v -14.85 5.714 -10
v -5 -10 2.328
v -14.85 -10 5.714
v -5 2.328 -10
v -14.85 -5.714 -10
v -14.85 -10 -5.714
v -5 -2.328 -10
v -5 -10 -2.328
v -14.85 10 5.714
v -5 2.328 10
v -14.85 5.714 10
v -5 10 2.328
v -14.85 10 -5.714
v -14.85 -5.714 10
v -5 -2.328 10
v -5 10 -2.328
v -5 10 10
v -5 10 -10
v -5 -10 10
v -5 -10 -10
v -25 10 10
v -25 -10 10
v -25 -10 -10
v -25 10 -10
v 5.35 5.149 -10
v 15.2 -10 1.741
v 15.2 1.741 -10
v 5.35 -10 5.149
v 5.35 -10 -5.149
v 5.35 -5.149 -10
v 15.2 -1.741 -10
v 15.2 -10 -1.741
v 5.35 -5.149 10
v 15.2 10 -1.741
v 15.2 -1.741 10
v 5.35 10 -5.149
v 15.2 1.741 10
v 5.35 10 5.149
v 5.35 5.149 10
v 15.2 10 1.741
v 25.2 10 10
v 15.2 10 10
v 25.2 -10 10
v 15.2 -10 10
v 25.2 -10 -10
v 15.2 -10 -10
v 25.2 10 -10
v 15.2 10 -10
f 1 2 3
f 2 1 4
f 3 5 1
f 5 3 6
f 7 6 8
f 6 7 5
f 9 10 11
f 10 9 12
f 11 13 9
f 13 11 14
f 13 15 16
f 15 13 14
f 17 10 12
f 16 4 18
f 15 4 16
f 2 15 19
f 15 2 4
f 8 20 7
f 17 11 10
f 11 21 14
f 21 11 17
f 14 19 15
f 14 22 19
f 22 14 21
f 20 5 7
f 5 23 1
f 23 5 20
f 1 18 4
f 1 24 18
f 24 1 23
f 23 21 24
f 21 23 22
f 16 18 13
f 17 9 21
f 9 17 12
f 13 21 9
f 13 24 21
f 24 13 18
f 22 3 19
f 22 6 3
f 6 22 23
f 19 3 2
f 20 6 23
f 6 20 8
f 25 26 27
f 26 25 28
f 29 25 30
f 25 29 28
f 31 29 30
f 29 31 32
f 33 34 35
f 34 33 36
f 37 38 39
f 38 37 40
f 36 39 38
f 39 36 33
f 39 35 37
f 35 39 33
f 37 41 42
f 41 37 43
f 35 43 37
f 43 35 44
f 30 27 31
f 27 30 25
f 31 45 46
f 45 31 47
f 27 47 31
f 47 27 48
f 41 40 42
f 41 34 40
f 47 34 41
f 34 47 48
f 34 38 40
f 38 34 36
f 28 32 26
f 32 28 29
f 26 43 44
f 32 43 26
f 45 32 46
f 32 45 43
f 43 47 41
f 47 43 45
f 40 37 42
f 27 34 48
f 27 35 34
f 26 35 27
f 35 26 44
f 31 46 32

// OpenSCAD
/**
  "Impossible" dovetail joint.
  Inspired by http://www.thingiverse.com/thing:172827.
 */

/* [Dimensions] */

// Each piece will be a cube with this dimension
SIZE = 20;

// Increase for a looser fit
SLACK = 0.4;

// Set this to ASSEMBLED, SEPARATE, PRINT1, or PRINT2.
STYLE = "SEPARATE";  // ["ASSEMBLED":Assembled, "SEPARATE":Separate, "PRINT1":First piece for printing, "PRINT2":Second piece for printing]
 
/* [Hidden] */

EPSILON = 0.1;

/* This function from:
 *  Dovetail parametric generator for OpenScad
 *  Générateur de queue d'aronde pour OpenScad
 *
 *  Copyright (c) 2012 Charles Rincheval.  All rights reserved.
 *  https://github.com/hugokernel/OpenSCAD_Dovetail
 *  http://www.digitalspirit.org/
 * 
 *  Create one tooth
 *  @param int width        Tooth width
 *  @param int height       Tooth height
 *  @param int thickness    Tooth thickness
 */
module dovetail_tooth(width, height, thickness, slack) {
    offset = width / 3 + slack / 2;
    translate([- width / 2, - height / 2, 0]) {
        linear_extrude(height = thickness) {
            polygon([[0, 0], [width, 0], [width - offset, height], [offset, height]]);
        }
    }
}

/* Makes two halves of a prism assembled by an "impossible" dovetail joint.
  Each piece will be a cube with dimension d; assembled they are 3/2 * d long.
  (That is, they overlap by 50% of their length.)
  'slack' is the sliding tolerance in mm.
  'part' is 1 for the first part, 2 for the second.
*/
module impossible(d, slack, part) {
  h = d * sqrt(2);
  big = 10;
  
  if (part == 1)
    translate([-d/4,0,0])
      color("GREEN") 
        difference() {
          cube(size = d, center = true);
          for (i=[-1, 1])
            translate([d/4 + slack, i * d/2, 0])  // orient on the edge and centered on the face
              rotate([-45,0,0])  // the trick: 45-degree rotation
                rotate([180,90,90])  // cutting orientation
                  translate([0, 0, -big * d / 2])  // center
                    dovetail_tooth(h / 3.5, d/2 + slack + EPSILON, big * d, -slack / sqrt(2));
        }

  if (part == 2)
    translate([+d/4 + slack/2,0,0])
      color("RED") 
        union() {
          translate([d/4, 0, 0])
            cube(size = [d/2, d, d], center = true);
          intersection() {
            translate([0, 0, 0])
              cube(size = d, center = true);
            for (i=[-1, 1])
              translate([-d/4 + slack, i * d/2, 0])  // orient on the edge and centered on the face
                rotate([-45,0,0])  // the trick: 45-degree rotation
                  rotate([180,90,90])  // cutting orientation
                    translate([0, 0, -big * d / 2])  // center
                      dovetail_tooth(h / 3.5 - slack * 2, d/2 + slack + EPSILON, big * d, slack / sqrt(2));
          }
        }
}

// Presentation

if (STYLE == "SEPARATE") {
  translate([-SIZE/2, 0, 0])
    impossible(SIZE, SLACK, 1);
  
  translate([SIZE/2, 0, 0])
    impossible(SIZE, SLACK, 2);
} else if (STYLE == "ASSEMBLED") {
  impossible(SIZE, SLACK, 1);
  impossible(SIZE, SLACK, 2);
} else if (STYLE == "PRINT1") {
  rotate([0,-90,0])
    impossible(SIZE, SLACK, 1);
} else if (STYLE == "PRINT2") {
  rotate([0,90,0])
    impossible(SIZE, SLACK, 2);
}
